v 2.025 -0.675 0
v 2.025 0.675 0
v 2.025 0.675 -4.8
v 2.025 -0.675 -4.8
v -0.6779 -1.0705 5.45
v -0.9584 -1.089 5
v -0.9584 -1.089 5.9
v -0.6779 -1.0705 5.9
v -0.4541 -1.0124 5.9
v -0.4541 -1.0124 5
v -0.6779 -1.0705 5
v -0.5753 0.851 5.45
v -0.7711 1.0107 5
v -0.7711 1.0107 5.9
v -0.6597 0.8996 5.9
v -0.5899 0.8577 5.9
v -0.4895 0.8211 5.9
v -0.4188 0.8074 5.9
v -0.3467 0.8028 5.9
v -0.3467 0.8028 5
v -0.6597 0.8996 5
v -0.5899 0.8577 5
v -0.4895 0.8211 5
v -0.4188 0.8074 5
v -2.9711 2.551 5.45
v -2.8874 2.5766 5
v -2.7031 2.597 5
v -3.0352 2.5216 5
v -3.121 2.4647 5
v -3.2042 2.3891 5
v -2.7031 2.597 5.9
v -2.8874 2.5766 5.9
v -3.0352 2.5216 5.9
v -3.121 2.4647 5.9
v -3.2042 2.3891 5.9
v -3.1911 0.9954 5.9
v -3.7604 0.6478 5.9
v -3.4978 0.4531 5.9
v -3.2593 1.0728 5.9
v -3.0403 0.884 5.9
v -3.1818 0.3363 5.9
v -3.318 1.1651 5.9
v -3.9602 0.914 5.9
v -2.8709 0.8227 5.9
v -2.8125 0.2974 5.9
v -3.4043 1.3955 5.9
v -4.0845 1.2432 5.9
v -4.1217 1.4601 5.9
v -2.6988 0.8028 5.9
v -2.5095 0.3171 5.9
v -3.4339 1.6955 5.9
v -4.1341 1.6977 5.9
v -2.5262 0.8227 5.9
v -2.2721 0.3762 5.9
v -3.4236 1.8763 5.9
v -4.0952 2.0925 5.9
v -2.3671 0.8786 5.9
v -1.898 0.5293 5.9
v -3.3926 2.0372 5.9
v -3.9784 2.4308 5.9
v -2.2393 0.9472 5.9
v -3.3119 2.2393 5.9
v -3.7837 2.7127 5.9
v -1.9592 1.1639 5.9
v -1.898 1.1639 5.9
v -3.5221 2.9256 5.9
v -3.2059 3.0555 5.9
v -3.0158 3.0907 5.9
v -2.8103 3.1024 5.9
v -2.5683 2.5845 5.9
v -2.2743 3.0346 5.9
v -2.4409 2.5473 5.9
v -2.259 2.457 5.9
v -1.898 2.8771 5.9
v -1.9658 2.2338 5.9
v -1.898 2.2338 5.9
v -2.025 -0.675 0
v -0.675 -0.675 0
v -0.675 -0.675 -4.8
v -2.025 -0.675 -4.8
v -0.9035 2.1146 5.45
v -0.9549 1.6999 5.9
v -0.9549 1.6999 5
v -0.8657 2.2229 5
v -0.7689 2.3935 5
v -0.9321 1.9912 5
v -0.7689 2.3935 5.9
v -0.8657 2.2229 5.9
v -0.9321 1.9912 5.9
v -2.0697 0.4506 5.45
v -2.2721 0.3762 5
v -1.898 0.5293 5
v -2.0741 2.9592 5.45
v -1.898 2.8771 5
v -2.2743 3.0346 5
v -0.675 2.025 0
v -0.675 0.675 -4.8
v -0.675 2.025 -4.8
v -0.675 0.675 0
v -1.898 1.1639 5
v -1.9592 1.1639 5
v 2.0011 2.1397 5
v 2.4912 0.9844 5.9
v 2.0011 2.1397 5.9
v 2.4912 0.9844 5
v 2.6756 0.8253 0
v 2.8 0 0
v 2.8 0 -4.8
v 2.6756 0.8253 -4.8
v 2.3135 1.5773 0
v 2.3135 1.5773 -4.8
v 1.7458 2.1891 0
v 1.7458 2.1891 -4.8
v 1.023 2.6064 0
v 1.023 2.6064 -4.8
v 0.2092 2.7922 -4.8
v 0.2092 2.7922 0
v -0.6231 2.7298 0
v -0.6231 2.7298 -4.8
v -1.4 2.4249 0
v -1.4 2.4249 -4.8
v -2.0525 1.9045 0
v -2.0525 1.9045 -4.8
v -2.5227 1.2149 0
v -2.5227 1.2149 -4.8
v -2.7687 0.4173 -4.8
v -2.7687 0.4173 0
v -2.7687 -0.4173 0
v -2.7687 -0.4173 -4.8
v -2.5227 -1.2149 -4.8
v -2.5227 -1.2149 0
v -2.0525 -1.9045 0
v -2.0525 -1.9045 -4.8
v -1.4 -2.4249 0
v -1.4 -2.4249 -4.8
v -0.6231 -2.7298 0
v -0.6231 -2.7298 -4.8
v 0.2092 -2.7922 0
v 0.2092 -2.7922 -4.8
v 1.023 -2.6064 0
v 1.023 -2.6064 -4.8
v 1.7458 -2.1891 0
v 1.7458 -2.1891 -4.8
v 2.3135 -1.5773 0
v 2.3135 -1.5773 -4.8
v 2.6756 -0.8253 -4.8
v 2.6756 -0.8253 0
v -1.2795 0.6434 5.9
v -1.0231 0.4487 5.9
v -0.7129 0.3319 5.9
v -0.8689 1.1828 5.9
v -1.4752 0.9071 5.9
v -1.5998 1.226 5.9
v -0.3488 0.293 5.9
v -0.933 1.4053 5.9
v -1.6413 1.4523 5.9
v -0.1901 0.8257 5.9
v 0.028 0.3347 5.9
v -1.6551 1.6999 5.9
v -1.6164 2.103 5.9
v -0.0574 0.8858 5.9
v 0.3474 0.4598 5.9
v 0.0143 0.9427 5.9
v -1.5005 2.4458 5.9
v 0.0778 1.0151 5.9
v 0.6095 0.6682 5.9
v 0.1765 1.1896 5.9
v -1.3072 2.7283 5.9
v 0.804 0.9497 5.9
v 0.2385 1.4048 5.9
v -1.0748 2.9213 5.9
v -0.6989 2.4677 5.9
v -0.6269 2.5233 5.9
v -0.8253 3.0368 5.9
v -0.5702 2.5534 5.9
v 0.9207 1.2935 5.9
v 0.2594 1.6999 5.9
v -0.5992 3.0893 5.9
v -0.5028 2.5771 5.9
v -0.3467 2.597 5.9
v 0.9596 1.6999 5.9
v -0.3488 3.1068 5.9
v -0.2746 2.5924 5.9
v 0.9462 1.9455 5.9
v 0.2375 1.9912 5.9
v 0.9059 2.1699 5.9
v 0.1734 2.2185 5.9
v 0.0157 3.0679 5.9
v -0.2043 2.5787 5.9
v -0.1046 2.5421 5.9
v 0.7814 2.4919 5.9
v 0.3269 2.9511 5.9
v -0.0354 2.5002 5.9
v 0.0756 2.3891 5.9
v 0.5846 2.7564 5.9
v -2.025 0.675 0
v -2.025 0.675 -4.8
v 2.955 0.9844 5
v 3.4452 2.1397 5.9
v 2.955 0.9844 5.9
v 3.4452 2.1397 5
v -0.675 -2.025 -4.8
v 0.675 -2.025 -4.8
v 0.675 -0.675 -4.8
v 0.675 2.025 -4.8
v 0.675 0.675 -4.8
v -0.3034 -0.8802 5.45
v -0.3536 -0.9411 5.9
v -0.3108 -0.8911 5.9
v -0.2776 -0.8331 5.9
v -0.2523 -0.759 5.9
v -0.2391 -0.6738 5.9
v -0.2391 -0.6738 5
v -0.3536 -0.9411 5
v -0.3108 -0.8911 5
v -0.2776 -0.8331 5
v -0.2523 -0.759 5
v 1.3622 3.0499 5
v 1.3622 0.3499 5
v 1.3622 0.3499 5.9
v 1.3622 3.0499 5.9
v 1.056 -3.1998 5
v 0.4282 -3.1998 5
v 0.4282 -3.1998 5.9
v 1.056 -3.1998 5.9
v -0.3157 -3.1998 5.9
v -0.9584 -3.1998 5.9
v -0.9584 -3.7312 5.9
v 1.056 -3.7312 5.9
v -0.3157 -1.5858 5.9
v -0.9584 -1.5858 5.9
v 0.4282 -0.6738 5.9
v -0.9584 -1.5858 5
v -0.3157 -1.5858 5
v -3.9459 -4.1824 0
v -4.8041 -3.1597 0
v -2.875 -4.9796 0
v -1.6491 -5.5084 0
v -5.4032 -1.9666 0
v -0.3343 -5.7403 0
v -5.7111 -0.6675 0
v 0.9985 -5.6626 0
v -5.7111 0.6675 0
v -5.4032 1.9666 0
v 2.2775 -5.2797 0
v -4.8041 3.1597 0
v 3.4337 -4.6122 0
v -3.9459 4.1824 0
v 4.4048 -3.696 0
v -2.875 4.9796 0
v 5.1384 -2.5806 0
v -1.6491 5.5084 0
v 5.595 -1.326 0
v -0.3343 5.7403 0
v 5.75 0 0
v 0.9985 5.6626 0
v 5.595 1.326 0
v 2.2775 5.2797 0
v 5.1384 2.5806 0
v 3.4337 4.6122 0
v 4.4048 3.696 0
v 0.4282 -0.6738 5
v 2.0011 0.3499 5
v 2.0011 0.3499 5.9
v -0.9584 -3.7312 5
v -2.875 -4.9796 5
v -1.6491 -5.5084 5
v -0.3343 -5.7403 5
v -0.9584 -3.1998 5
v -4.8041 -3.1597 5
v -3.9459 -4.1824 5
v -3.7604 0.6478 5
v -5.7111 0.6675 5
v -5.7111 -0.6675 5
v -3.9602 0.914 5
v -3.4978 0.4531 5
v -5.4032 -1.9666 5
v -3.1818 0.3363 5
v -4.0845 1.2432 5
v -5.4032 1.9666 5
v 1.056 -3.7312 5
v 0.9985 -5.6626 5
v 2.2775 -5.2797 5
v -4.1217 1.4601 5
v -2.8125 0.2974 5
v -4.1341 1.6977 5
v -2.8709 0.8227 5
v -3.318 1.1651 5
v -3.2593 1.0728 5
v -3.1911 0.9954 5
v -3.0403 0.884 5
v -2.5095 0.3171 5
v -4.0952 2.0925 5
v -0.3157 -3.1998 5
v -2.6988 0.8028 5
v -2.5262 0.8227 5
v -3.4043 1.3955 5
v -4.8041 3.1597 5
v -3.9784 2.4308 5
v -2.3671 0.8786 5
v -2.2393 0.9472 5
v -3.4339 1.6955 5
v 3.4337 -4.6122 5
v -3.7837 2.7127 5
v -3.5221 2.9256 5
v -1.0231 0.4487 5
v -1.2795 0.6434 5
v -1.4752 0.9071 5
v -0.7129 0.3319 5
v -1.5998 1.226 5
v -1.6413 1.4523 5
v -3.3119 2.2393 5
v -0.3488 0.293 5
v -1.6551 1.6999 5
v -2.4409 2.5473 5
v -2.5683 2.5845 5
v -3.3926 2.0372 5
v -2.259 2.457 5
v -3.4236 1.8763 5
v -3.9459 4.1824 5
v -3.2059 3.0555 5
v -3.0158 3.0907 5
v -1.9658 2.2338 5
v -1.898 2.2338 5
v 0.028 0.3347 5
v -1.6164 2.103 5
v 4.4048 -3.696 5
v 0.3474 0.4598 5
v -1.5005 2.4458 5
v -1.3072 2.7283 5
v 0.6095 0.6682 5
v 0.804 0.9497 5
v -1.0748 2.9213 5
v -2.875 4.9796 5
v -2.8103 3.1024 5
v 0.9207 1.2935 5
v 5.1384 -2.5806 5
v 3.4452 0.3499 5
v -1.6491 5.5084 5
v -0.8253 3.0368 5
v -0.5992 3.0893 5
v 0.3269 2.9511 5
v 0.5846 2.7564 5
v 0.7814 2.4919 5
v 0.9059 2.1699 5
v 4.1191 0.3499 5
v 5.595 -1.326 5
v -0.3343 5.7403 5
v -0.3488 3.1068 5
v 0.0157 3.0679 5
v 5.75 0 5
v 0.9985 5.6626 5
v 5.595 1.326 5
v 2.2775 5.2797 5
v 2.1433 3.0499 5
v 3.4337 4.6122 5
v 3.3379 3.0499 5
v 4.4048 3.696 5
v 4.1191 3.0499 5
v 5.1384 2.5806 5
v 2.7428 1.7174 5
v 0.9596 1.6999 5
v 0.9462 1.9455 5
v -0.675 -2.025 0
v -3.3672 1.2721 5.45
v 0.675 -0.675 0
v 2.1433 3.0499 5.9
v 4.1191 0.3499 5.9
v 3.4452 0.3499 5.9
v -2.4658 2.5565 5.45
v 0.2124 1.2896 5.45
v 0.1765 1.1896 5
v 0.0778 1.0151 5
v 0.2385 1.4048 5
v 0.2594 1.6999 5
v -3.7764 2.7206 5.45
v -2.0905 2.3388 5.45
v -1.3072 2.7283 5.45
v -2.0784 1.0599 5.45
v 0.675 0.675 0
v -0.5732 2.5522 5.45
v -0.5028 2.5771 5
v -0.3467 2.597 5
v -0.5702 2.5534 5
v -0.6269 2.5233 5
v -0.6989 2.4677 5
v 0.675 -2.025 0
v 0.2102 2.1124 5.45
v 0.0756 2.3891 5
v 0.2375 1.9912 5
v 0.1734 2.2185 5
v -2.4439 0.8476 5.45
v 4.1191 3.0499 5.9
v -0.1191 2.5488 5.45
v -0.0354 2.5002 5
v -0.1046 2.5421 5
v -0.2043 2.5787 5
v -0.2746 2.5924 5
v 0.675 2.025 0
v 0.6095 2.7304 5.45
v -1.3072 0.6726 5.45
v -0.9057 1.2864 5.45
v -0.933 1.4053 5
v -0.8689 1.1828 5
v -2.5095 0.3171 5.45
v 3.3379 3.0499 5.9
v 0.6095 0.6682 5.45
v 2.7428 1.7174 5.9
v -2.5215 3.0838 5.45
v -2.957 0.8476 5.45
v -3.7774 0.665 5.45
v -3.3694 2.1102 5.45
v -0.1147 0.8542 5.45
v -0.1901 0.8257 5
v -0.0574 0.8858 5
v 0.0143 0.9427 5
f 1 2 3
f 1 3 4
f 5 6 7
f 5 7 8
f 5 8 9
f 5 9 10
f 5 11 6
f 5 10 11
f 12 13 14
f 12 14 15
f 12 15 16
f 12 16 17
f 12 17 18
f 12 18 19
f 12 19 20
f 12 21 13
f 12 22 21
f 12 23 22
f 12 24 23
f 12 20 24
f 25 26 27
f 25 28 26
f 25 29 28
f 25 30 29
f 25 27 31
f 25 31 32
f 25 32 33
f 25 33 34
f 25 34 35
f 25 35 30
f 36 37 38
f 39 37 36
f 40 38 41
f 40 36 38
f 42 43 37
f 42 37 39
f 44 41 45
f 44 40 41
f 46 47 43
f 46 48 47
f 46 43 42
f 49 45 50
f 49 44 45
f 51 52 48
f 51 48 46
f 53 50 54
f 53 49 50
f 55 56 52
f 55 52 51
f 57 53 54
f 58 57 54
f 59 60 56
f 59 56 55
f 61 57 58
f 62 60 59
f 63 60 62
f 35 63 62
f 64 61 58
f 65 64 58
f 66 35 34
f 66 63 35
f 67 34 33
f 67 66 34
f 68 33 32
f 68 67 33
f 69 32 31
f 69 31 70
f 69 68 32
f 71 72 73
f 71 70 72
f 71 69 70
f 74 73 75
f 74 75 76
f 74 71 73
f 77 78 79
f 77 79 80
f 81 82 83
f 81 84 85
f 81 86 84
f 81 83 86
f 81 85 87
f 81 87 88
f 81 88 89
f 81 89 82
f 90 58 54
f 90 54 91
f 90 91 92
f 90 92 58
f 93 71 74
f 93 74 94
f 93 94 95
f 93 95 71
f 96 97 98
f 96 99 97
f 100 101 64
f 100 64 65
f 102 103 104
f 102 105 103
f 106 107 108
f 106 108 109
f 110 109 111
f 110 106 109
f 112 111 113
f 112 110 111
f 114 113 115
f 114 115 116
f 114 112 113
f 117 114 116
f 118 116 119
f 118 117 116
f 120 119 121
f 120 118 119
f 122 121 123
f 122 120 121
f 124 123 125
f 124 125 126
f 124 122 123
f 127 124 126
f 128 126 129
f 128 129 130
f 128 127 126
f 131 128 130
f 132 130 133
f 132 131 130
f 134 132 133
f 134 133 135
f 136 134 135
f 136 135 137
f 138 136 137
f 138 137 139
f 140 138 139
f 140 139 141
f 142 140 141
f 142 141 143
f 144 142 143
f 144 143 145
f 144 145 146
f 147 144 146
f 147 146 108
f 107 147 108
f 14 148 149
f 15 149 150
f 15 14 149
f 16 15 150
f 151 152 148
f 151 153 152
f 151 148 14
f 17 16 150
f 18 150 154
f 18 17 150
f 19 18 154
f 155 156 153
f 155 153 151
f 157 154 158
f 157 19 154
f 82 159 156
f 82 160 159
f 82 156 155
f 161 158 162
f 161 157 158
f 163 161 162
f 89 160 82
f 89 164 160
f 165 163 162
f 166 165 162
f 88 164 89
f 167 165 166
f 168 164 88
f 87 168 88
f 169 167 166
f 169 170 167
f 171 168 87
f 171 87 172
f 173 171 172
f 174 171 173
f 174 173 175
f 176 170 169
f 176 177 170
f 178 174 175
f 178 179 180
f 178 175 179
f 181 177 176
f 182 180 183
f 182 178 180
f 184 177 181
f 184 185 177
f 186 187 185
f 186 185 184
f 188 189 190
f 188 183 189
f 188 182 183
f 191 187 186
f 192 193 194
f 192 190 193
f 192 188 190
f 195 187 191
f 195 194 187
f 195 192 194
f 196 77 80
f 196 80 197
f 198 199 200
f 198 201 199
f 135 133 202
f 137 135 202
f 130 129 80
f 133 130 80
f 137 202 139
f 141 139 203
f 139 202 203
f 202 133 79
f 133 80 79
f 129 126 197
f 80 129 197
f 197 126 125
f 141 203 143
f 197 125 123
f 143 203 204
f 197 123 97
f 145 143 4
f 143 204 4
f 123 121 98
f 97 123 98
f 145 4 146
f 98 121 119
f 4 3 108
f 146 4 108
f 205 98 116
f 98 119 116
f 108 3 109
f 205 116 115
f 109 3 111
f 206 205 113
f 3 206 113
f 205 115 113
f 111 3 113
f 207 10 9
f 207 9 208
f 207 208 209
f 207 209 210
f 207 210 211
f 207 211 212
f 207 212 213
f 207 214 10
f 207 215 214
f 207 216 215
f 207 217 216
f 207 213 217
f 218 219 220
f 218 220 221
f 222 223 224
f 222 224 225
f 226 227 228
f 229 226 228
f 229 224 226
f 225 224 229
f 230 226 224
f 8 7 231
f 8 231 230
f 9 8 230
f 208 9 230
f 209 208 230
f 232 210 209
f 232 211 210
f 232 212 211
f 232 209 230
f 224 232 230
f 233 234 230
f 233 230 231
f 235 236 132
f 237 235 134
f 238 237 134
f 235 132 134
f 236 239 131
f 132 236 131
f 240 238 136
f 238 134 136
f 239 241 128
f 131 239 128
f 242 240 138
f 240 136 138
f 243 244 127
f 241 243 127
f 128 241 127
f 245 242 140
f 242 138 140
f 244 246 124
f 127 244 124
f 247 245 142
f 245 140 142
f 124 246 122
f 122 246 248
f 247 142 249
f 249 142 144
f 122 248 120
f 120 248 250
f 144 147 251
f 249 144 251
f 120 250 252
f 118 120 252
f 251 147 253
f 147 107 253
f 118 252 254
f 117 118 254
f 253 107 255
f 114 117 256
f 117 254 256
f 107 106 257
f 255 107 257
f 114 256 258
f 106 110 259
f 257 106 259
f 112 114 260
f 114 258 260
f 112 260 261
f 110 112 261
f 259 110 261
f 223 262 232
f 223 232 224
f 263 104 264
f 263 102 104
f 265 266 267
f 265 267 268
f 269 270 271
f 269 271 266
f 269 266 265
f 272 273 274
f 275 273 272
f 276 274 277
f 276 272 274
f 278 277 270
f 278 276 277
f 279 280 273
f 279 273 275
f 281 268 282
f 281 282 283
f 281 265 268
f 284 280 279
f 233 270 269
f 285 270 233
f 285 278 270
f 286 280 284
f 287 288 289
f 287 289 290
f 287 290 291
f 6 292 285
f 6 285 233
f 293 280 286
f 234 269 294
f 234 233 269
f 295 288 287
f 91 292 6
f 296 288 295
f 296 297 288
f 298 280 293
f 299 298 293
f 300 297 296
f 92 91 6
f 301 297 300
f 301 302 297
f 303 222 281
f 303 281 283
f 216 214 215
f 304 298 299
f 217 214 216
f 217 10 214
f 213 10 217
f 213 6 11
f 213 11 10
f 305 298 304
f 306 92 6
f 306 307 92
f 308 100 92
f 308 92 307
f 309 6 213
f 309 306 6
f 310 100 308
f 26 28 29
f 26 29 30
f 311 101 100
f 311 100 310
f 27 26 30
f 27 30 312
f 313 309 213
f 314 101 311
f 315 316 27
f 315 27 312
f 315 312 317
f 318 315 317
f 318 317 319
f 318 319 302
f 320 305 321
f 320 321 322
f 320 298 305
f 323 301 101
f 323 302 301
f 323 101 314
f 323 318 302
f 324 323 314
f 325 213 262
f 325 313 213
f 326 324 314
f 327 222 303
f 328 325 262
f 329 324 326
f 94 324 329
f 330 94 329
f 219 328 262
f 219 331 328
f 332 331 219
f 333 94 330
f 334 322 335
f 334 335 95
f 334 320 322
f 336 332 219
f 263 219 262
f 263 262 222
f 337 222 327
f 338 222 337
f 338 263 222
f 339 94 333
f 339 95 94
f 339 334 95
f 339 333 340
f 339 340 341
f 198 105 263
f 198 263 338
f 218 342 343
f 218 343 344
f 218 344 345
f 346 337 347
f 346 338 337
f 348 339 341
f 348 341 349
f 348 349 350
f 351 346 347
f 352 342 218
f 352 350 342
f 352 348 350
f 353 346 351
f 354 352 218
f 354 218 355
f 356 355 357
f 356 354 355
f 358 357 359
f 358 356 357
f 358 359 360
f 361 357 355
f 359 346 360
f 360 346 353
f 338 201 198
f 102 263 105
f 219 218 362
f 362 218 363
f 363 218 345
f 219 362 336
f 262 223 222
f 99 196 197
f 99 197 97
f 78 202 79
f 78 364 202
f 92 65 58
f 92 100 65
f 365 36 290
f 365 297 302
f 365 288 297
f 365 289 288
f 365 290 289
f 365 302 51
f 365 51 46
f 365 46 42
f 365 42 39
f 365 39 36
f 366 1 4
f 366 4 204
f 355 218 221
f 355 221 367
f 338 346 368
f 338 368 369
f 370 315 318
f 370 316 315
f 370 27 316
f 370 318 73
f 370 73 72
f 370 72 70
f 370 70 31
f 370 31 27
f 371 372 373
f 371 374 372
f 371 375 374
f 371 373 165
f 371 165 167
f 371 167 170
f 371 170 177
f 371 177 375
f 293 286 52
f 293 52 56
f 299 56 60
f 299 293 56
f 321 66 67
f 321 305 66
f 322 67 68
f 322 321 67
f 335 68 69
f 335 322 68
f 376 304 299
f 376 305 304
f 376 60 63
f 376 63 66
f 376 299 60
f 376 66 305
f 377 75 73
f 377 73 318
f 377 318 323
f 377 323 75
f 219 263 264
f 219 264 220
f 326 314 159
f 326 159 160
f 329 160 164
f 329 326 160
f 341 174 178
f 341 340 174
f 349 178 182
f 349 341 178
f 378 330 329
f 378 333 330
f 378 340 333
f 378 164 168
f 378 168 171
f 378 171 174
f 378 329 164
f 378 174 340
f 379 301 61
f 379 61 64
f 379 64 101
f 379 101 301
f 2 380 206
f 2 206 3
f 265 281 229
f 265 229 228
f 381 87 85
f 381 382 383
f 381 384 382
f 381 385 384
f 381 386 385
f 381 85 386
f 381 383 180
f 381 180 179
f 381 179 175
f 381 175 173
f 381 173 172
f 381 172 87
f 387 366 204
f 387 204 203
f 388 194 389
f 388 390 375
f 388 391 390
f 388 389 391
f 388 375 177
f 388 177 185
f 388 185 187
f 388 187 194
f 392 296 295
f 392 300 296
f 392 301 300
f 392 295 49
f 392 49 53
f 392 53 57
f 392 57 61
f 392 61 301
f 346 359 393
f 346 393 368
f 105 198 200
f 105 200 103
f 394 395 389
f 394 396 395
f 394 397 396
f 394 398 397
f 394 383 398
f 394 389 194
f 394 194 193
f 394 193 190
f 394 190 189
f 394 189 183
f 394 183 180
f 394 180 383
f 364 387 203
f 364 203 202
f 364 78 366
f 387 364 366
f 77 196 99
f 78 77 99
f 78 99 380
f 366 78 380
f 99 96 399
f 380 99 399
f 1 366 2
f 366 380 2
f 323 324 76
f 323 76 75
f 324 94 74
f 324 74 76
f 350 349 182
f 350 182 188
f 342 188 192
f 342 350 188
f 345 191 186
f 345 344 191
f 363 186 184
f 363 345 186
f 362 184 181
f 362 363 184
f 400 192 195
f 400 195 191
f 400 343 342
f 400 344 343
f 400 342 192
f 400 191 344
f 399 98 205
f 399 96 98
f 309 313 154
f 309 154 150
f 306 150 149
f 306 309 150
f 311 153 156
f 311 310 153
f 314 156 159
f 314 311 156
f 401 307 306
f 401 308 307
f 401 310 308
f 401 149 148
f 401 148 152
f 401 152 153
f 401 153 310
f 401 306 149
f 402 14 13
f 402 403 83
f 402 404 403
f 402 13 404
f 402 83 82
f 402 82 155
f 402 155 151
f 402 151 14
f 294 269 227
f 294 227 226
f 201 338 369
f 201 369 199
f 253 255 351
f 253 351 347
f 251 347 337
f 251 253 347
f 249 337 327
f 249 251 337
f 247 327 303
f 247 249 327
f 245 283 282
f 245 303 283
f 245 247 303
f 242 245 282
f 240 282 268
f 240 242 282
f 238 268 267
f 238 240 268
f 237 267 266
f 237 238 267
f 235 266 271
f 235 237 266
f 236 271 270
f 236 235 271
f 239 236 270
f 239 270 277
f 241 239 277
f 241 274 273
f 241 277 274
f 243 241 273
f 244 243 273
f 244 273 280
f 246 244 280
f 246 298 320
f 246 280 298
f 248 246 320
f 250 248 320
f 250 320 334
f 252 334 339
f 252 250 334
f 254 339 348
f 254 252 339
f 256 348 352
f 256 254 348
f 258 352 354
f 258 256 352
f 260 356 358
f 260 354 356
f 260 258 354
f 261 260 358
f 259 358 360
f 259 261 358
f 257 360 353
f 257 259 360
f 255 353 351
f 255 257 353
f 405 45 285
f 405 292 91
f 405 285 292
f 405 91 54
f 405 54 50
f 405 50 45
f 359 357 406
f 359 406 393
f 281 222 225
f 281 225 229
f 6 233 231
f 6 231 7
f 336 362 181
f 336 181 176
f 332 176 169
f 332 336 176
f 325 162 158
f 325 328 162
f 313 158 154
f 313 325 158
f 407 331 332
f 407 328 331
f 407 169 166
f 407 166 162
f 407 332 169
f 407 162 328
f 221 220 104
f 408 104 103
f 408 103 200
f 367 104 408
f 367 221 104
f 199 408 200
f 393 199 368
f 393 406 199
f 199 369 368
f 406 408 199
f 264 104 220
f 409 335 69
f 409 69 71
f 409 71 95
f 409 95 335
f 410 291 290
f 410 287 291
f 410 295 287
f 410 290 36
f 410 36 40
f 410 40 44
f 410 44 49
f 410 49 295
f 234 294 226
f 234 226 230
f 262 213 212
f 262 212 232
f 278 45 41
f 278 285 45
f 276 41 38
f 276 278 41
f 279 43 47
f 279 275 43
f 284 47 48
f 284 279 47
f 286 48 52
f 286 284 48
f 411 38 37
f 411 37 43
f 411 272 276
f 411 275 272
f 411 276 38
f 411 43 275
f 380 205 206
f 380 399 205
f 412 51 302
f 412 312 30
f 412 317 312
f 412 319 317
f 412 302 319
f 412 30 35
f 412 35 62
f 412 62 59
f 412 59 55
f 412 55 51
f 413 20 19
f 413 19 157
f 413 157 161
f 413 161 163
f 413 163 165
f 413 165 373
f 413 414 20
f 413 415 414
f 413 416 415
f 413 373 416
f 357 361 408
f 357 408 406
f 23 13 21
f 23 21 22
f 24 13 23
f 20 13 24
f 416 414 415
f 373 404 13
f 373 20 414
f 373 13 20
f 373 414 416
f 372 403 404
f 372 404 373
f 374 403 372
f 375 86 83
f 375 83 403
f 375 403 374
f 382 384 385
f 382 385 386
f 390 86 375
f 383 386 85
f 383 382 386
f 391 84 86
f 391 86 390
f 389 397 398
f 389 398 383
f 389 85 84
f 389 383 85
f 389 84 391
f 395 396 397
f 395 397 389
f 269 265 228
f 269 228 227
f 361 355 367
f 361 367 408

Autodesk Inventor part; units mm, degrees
ref_plane "YZ Plane" through (0, 0, 0) normal (1, 0, 0) x (0, 1, 0)
ref_plane "XZ Plane" through (0, 0, 0) normal (0, 1, 0) x (-1, 0, 0)
ref_plane "XY Plane" through (0, 0, 0) normal (0, 0, 1) x (1, 0, 0)
sketch "Sketch1" plane through (0, 0, 0) normal (0, 0, 1) x (1, 0, 0)
  circle A0 centre (0, 0) radius 6.22 construction
  circle A1 centre (0, 0) radius 2.8
  line L0 (-0.675, 0.675) -> (-0.675, 2.025)
  line L1 (-0.675, 2.025) -> (0.675, 2.025)
  line L2 (0.675, 2.025) -> (0.675, 0.675)
  line L3 (0.675, 0.675) -> (2.025, 0.675)
  line L4 (2.025, 0.675) -> (2.025, -0.675)
  line L5 (2.025, -0.675) -> (0.675, -0.675)
  line L6 (0.675, -0.675) -> (0.675, -2.025)
  line L7 (0.675, -2.025) -> (-0.675, -2.025)
  line L8 (-0.675, -2.025) -> (-0.675, -0.675)
  line L9 (-0.675, -0.675) -> (-2.025, -0.675)
  line L10 (-2.025, -0.675) -> (-2.025, 0.675)
  line L11 (-2.025, 0.675) -> (-0.675, 0.675)
  circle A2 centre (0, 0) radius 5.75
  point P0 (-6.07, -6.1)
  dimension "d0" = 12.44
  dimension "d1" = 0.47
extrude "Extrusion1" add sketch "Sketch1" along normal blind 5 contours A1 | L0 L1 L2 L3 L4 L5 L6 L7 L8 L9 L10 L11 | A2
extrude "Extrusion2" add sketch "Sketch1" against normal blind 4.8 contours A1
sketch "Sketch2" plane through (0, 0, 5) normal (0, 0, 1) x (1, 0, 0)
  point P0 (0, 0)
sketch "Sketch3" plane through (0, 0, 5) normal (0, 0, 1) x (1, 0, 0)
  line L0 (-4.2566, 3.1068) -> (4.2414, 3.1068) construction
  line L1 (4.2414, 3.1068) -> (4.2414, 0.2437) construction
  line L2 (4.2414, 0.2437) -> (-4.2566, 0.2437) construction
  line L3 (-4.2566, 0.2437) -> (-4.2566, 3.1068) construction
  line L4 (-1.3588, -0.6738) -> (1.3131, -0.6738) construction
  line L5 (1.3131, -0.6738) -> (1.3131, -3.7312) construction
  line L6 (1.3131, -3.7312) -> (-1.3588, -3.7312) construction
  line L7 (-1.3588, -3.7312) -> (-1.3588, -0.6738) construction
  spline S0 degree 2 poles (-2.8125, 0.2974) (-3.4208, 0.2974) (-4.1341, 1.0326) (-4.1341, 1.6977) knots 0 0 0 1 2 2 2
  spline S1 degree 2 poles (-4.1341, 1.6977) (-4.1341, 2.3388) (-3.4186, 3.1024) (-2.8103, 3.1024) knots 0 0 0 1 2 2 2
  spline S2 degree 2 poles (-2.8103, 3.1024) (-2.6506, 3.1024) (-2.3924, 3.0652) (-2.2743, 3.0346) knots 0 0 0 1 2 2 2
  spline S3 degree 2 poles (-2.2743, 3.0346) (-2.1824, 3.0062) (-1.9658, 2.9121) (-1.898, 2.8771) knots 0 0 0 1 2 2 2
  line L8 (-1.898, 2.8771) -> (-1.898, 2.2338)
  line L9 (-1.898, 2.2338) -> (-1.9658, 2.2338)
  spline S4 degree 2 poles (-1.9658, 2.2338) (-2.0161, 2.2775) (-2.1649, 2.4001) (-2.259, 2.457) knots 0 0 0 1 2 2 2
  spline S5 degree 2 poles (-2.259, 2.457) (-2.3531, 2.516) (-2.5784, 2.597) (-2.7031, 2.597) knots 0 0 0 1 2 2 2
  spline S6 degree 2 poles (-2.7031, 2.597) (-2.8497, 2.597) (-3.0926, 2.5051) (-3.2042, 2.3891) knots 0 0 0 1 2 2 2
  spline S7 degree 2 poles (-3.2042, 2.3891) (-3.3048, 2.2863) (-3.4339, 1.934) (-3.4339, 1.6955) knots 0 0 0 1 2 2 2
  spline S8 degree 2 poles (-3.4339, 1.6955) (-3.4339, 1.4439) (-3.3005, 1.1004) (-3.1911, 0.9954) knots 0 0 0 1 2 2 2
  spline S9 degree 2 poles (-3.1911, 0.9954) (-3.086, 0.8925) (-2.8279, 0.8028) (-2.6988, 0.8028) knots 0 0 0 1 2 2 2
  spline S10 degree 2 poles (-2.6988, 0.8028) (-2.5653, 0.8028) (-2.3224, 0.8925) (-2.2393, 0.9472) knots 0 0 0 1 2 2 2
  spline S11 degree 2 poles (-2.2393, 0.9472) (-2.1474, 1.0019) (-2.0095, 1.1179) (-1.9592, 1.1639) knots 0 0 0 1 2 2 2
  line L10 (-1.9592, 1.1639) -> (-1.898, 1.1639)
  line L11 (-1.898, 1.1639) -> (-1.898, 0.5293)
  spline S12 degree 2 poles (-1.898, 0.5293) (-1.9723, 0.4943) (-2.1671, 0.4068) (-2.2721, 0.3762) knots 0 0 0 1 2 2 2
  spline S13 degree 2 poles (-2.2721, 0.3762) (-2.399, 0.3368) (-2.62, 0.2974) (-2.8125, 0.2974) knots 0 0 0 1 2 2 2
  spline S14 degree 2 poles (0.9596, 1.6999) (0.9596, 1.0435) (0.2594, 0.293) (-0.3488, 0.293) knots 0 0 0 1 2 2 2
  spline S15 degree 2 poles (-0.3488, 0.293) (-0.9593, 0.293) (-1.6551, 1.0523) (-1.6551, 1.6999) knots 0 0 0 1 2 2 2
  spline S16 degree 2 poles (-1.6551, 1.6999) (-1.6551, 2.3498) (-0.9593, 3.1068) (-0.3488, 3.1068) knots 0 0 0 1 2 2 2
  spline S17 degree 2 poles (-0.3488, 3.1068) (0.2594, 3.1068) (0.9596, 2.3541) (0.9596, 1.6999) knots 0 0 0 1 2 2 2
  spline S18 degree 2 poles (0.2594, 1.6999) (0.2594, 1.9428) (0.161, 2.2819) (0.0756, 2.3891) knots 0 0 0 1 2 2 2
  spline S19 degree 2 poles (0.0756, 2.3891) (-0.0097, 2.5007) (-0.2285, 2.597) (-0.3467, 2.597) knots 0 0 0 1 2 2 2
  spline S20 degree 2 poles (-0.3467, 2.597) (-0.4714, 2.597) (-0.6749, 2.5073) (-0.7689, 2.3935) knots 0 0 0 1 2 2 2
  spline S21 degree 2 poles (-0.7689, 2.3935) (-0.8521, 2.2885) (-0.9549, 1.9406) (-0.9549, 1.6999) knots 0 0 0 1 2 2 2
  spline S22 degree 2 poles (-0.9549, 1.6999) (-0.9549, 1.4505) (-0.8565, 1.1223) (-0.7711, 1.0107) knots 0 0 0 1 2 2 2
  spline S23 degree 2 poles (-0.7711, 1.0107) (-0.6858, 0.8991) (-0.4648, 0.8028) (-0.3467, 0.8028) knots 0 0 0 1 2 2 2
  spline S24 degree 2 poles (-0.3467, 0.8028) (-0.2263, 0.8028) (-0.0031, 0.9057) (0.0778, 1.0151) knots 0 0 0 1 2 2 2
  spline S25 degree 2 poles (0.0778, 1.0151) (0.1653, 1.1332) (0.2594, 1.4461) (0.2594, 1.6999) knots 0 0 0 1 2 2 2
  line L12 (4.1191, 0.3499) -> (3.4452, 0.3499)
  line L13 (3.4452, 0.3499) -> (3.4452, 2.1397)
  line L14 (3.4452, 2.1397) -> (2.955, 0.9844)
  line L15 (2.955, 0.9844) -> (2.4912, 0.9844)
  line L16 (2.4912, 0.9844) -> (2.0011, 2.1397)
  line L17 (2.0011, 2.1397) -> (2.0011, 0.3499)
  line L18 (2.0011, 0.3499) -> (1.3622, 0.3499)
  line L19 (1.3622, 0.3499) -> (1.3622, 3.0499)
  line L20 (1.3622, 3.0499) -> (2.1433, 3.0499)
  line L21 (2.1433, 3.0499) -> (2.7428, 1.7174)
  line L22 (2.7428, 1.7174) -> (3.3379, 3.0499)
  line L23 (3.3379, 3.0499) -> (4.1191, 3.0499)
  line L24 (4.1191, 3.0499) -> (4.1191, 0.3499)
  line L25 (1.056, -3.7312) -> (-0.9584, -3.7312)
  line L26 (-0.9584, -3.7312) -> (-0.9584, -3.1998)
  line L27 (-0.9584, -3.1998) -> (-0.3157, -3.1998)
  line L28 (-0.3157, -3.1998) -> (-0.3157, -1.5858)
  line L29 (-0.3157, -1.5858) -> (-0.9584, -1.5858)
  line L30 (-0.9584, -1.5858) -> (-0.9584, -1.089)
  spline S26 degree 2 poles (-0.9584, -1.089) (-0.8175, -1.089) (-0.5382, -1.052) (-0.4541, -1.0124) knots 0 0 0 1 2 2 2
  spline S27 degree 2 poles (-0.4541, -1.0124) (-0.3578, -0.963) (-0.249, -0.7974) (-0.2391, -0.6738) knots 0 0 0 1 2 2 2
  line L31 (-0.2391, -0.6738) -> (0.4282, -0.6738)
  line L32 (0.4282, -0.6738) -> (0.4282, -3.1998)
  line L33 (0.4282, -3.1998) -> (1.056, -3.1998)
  line L34 (1.056, -3.1998) -> (1.056, -3.7312)
  point P0 (0, 0)
  point P1 (-0.0076, 0.2437)
  point P2 (-0.0228, -3.7312)
extrude "Extrusion3" add sketch "Sketch3" along normal blind 0.9
properties part number "IPC Com 1 key"
